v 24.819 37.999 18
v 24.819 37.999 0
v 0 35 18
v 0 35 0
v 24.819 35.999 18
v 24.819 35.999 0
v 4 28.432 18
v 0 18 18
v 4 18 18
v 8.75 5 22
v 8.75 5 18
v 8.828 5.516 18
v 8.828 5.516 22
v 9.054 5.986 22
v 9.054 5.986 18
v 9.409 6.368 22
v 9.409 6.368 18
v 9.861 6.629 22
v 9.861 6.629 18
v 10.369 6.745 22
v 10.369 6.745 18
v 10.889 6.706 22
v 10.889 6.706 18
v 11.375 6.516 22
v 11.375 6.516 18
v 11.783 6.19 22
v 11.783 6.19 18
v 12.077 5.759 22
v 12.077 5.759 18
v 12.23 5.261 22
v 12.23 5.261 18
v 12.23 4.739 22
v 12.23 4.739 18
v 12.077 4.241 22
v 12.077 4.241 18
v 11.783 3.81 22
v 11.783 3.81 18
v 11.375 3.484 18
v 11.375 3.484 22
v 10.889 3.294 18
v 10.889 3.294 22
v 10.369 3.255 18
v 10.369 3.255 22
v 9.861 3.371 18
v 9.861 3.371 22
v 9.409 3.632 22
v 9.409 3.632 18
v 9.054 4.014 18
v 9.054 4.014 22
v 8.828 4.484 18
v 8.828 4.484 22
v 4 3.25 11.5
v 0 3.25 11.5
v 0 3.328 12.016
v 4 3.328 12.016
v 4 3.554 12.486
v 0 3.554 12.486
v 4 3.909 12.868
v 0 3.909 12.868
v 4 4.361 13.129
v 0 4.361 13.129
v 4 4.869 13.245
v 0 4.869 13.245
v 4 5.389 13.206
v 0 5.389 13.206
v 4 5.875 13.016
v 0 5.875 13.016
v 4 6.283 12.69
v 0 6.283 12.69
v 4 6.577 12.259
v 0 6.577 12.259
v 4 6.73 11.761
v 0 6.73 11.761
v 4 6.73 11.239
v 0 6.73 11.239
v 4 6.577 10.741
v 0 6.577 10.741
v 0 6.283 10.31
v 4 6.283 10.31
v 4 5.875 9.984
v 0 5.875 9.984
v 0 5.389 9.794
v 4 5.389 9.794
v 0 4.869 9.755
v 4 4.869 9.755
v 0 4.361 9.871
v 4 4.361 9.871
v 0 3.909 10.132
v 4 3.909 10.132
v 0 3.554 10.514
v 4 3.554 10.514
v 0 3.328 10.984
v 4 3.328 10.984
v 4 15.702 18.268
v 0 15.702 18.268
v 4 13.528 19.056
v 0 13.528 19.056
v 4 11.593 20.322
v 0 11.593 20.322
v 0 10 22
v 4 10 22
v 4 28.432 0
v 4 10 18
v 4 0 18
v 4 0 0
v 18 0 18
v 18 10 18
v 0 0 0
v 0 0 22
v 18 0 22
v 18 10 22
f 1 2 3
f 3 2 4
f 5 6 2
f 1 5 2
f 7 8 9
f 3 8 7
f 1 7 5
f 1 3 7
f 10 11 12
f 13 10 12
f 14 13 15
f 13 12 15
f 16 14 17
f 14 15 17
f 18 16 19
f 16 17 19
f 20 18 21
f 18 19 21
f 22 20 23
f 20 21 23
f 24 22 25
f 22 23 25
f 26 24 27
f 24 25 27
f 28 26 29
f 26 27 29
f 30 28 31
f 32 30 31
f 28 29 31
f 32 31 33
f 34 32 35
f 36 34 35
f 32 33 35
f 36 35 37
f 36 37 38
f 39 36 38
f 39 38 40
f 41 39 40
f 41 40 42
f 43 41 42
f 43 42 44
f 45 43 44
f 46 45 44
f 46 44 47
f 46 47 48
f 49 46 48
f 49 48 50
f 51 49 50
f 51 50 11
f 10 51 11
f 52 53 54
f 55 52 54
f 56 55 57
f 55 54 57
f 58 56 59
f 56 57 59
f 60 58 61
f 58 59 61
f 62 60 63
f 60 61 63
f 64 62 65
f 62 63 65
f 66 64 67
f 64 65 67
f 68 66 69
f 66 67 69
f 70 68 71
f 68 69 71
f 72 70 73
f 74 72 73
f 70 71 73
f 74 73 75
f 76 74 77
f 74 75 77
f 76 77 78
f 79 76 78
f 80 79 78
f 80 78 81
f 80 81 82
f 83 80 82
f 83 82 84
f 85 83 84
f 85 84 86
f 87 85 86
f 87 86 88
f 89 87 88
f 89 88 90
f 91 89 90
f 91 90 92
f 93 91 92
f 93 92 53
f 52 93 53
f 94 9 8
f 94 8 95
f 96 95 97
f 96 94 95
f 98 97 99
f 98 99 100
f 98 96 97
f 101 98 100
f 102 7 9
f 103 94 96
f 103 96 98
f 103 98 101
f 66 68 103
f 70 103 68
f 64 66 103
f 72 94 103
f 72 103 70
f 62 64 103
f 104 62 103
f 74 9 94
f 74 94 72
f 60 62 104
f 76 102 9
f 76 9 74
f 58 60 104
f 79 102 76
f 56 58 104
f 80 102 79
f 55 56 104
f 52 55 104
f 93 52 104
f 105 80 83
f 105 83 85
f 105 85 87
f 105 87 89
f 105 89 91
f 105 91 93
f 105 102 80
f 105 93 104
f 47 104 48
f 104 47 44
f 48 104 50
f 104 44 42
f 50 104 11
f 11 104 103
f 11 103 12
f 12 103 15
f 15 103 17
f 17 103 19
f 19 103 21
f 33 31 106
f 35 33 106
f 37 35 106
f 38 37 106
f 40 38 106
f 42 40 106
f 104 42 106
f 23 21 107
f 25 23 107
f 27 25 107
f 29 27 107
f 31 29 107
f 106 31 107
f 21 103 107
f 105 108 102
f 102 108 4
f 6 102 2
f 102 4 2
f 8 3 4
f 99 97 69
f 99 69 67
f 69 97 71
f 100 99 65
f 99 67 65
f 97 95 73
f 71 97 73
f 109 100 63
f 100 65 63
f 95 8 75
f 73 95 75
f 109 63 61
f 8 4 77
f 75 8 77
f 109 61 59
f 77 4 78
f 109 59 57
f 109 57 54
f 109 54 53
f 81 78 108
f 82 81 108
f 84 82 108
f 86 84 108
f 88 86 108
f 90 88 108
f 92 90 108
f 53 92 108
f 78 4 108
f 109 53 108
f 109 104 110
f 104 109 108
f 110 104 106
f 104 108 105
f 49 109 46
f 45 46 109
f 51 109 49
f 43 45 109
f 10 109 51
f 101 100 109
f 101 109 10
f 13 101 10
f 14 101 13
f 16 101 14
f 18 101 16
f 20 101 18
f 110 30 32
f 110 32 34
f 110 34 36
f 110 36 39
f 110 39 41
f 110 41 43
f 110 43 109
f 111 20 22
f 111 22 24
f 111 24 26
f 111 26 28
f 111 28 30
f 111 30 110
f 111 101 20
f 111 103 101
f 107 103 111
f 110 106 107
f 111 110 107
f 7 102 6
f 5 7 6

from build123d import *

# Parameters (mm, degrees)
EXTRUDE_1_DEPTH     = 18
SKETCH_2_R          = 1.75
CUT_EXTRUDE_1_DEPTH = 13
SKETCH_3_W          = 18
SKETCH_3_H          = 10
EXTRUDE_2_DEPTH     = 4
SKETCH_10_R         = 1.75
CUT_EXTRUDE_2_DEPTH = 49.825569575
FILLET_1_R          = 10


with BuildPart() as part:
    # 草图1 → 凸台-拉伸1 (new body)
    with BuildSketch(Plane.XY):
        Polygon((0, 0), (4, 0), (4, 28.432425182), (24.819457366, 35.999089204), (24.819457366, 37.999089204), (0, 35), align=None)
    extrude(amount=EXTRUDE_1_DEPTH)

    # 草图2 → 切除-拉伸1 (cut)
    with BuildSketch(Plane.ZY):
        with Locations(Location((11.5, 5, 0), (0, 0, 270))):
            Circle(SKETCH_2_R)
    extrude(amount=-CUT_EXTRUDE_1_DEPTH, mode=Mode.SUBTRACT)

    # 草图3 → 凸台-拉伸2 (add)
    with BuildSketch(Plane.XY.offset(18)):
        with Locations((9, 5)):
            Rectangle(SKETCH_3_W, SKETCH_3_H)
    extrude(amount=EXTRUDE_2_DEPTH)

    # 草图10 → 切除-拉伸2 (cut, through all)
    with BuildSketch(Plane(origin=(0, 0, 18), x_dir=(-1, 0, 0), z_dir=(0, 0, -1))):
        with Locations((-10.5, 5)):
            Circle(SKETCH_10_R)
    extrude(amount=-CUT_EXTRUDE_2_DEPTH, mode=Mode.SUBTRACT)

    # 圆角1
    # the kernel refuses this fillet: 10 mm, written as the material it adds along each edge
    with BuildSketch(Plane(origin=(4, 10, 18), x_dir=(0, 1, 0), z_dir=(-1, 0, 0))) as fillet_1_piece_1:
        with BuildLine():
            CenterArc((8, -10), FILLET_1_R, 90, 53.130102354)
            Line((0, -4), (0, 0))
            Line((0, 0), (8, 0))
        make_face()
    extrude(amount=4)


solid = part.part
